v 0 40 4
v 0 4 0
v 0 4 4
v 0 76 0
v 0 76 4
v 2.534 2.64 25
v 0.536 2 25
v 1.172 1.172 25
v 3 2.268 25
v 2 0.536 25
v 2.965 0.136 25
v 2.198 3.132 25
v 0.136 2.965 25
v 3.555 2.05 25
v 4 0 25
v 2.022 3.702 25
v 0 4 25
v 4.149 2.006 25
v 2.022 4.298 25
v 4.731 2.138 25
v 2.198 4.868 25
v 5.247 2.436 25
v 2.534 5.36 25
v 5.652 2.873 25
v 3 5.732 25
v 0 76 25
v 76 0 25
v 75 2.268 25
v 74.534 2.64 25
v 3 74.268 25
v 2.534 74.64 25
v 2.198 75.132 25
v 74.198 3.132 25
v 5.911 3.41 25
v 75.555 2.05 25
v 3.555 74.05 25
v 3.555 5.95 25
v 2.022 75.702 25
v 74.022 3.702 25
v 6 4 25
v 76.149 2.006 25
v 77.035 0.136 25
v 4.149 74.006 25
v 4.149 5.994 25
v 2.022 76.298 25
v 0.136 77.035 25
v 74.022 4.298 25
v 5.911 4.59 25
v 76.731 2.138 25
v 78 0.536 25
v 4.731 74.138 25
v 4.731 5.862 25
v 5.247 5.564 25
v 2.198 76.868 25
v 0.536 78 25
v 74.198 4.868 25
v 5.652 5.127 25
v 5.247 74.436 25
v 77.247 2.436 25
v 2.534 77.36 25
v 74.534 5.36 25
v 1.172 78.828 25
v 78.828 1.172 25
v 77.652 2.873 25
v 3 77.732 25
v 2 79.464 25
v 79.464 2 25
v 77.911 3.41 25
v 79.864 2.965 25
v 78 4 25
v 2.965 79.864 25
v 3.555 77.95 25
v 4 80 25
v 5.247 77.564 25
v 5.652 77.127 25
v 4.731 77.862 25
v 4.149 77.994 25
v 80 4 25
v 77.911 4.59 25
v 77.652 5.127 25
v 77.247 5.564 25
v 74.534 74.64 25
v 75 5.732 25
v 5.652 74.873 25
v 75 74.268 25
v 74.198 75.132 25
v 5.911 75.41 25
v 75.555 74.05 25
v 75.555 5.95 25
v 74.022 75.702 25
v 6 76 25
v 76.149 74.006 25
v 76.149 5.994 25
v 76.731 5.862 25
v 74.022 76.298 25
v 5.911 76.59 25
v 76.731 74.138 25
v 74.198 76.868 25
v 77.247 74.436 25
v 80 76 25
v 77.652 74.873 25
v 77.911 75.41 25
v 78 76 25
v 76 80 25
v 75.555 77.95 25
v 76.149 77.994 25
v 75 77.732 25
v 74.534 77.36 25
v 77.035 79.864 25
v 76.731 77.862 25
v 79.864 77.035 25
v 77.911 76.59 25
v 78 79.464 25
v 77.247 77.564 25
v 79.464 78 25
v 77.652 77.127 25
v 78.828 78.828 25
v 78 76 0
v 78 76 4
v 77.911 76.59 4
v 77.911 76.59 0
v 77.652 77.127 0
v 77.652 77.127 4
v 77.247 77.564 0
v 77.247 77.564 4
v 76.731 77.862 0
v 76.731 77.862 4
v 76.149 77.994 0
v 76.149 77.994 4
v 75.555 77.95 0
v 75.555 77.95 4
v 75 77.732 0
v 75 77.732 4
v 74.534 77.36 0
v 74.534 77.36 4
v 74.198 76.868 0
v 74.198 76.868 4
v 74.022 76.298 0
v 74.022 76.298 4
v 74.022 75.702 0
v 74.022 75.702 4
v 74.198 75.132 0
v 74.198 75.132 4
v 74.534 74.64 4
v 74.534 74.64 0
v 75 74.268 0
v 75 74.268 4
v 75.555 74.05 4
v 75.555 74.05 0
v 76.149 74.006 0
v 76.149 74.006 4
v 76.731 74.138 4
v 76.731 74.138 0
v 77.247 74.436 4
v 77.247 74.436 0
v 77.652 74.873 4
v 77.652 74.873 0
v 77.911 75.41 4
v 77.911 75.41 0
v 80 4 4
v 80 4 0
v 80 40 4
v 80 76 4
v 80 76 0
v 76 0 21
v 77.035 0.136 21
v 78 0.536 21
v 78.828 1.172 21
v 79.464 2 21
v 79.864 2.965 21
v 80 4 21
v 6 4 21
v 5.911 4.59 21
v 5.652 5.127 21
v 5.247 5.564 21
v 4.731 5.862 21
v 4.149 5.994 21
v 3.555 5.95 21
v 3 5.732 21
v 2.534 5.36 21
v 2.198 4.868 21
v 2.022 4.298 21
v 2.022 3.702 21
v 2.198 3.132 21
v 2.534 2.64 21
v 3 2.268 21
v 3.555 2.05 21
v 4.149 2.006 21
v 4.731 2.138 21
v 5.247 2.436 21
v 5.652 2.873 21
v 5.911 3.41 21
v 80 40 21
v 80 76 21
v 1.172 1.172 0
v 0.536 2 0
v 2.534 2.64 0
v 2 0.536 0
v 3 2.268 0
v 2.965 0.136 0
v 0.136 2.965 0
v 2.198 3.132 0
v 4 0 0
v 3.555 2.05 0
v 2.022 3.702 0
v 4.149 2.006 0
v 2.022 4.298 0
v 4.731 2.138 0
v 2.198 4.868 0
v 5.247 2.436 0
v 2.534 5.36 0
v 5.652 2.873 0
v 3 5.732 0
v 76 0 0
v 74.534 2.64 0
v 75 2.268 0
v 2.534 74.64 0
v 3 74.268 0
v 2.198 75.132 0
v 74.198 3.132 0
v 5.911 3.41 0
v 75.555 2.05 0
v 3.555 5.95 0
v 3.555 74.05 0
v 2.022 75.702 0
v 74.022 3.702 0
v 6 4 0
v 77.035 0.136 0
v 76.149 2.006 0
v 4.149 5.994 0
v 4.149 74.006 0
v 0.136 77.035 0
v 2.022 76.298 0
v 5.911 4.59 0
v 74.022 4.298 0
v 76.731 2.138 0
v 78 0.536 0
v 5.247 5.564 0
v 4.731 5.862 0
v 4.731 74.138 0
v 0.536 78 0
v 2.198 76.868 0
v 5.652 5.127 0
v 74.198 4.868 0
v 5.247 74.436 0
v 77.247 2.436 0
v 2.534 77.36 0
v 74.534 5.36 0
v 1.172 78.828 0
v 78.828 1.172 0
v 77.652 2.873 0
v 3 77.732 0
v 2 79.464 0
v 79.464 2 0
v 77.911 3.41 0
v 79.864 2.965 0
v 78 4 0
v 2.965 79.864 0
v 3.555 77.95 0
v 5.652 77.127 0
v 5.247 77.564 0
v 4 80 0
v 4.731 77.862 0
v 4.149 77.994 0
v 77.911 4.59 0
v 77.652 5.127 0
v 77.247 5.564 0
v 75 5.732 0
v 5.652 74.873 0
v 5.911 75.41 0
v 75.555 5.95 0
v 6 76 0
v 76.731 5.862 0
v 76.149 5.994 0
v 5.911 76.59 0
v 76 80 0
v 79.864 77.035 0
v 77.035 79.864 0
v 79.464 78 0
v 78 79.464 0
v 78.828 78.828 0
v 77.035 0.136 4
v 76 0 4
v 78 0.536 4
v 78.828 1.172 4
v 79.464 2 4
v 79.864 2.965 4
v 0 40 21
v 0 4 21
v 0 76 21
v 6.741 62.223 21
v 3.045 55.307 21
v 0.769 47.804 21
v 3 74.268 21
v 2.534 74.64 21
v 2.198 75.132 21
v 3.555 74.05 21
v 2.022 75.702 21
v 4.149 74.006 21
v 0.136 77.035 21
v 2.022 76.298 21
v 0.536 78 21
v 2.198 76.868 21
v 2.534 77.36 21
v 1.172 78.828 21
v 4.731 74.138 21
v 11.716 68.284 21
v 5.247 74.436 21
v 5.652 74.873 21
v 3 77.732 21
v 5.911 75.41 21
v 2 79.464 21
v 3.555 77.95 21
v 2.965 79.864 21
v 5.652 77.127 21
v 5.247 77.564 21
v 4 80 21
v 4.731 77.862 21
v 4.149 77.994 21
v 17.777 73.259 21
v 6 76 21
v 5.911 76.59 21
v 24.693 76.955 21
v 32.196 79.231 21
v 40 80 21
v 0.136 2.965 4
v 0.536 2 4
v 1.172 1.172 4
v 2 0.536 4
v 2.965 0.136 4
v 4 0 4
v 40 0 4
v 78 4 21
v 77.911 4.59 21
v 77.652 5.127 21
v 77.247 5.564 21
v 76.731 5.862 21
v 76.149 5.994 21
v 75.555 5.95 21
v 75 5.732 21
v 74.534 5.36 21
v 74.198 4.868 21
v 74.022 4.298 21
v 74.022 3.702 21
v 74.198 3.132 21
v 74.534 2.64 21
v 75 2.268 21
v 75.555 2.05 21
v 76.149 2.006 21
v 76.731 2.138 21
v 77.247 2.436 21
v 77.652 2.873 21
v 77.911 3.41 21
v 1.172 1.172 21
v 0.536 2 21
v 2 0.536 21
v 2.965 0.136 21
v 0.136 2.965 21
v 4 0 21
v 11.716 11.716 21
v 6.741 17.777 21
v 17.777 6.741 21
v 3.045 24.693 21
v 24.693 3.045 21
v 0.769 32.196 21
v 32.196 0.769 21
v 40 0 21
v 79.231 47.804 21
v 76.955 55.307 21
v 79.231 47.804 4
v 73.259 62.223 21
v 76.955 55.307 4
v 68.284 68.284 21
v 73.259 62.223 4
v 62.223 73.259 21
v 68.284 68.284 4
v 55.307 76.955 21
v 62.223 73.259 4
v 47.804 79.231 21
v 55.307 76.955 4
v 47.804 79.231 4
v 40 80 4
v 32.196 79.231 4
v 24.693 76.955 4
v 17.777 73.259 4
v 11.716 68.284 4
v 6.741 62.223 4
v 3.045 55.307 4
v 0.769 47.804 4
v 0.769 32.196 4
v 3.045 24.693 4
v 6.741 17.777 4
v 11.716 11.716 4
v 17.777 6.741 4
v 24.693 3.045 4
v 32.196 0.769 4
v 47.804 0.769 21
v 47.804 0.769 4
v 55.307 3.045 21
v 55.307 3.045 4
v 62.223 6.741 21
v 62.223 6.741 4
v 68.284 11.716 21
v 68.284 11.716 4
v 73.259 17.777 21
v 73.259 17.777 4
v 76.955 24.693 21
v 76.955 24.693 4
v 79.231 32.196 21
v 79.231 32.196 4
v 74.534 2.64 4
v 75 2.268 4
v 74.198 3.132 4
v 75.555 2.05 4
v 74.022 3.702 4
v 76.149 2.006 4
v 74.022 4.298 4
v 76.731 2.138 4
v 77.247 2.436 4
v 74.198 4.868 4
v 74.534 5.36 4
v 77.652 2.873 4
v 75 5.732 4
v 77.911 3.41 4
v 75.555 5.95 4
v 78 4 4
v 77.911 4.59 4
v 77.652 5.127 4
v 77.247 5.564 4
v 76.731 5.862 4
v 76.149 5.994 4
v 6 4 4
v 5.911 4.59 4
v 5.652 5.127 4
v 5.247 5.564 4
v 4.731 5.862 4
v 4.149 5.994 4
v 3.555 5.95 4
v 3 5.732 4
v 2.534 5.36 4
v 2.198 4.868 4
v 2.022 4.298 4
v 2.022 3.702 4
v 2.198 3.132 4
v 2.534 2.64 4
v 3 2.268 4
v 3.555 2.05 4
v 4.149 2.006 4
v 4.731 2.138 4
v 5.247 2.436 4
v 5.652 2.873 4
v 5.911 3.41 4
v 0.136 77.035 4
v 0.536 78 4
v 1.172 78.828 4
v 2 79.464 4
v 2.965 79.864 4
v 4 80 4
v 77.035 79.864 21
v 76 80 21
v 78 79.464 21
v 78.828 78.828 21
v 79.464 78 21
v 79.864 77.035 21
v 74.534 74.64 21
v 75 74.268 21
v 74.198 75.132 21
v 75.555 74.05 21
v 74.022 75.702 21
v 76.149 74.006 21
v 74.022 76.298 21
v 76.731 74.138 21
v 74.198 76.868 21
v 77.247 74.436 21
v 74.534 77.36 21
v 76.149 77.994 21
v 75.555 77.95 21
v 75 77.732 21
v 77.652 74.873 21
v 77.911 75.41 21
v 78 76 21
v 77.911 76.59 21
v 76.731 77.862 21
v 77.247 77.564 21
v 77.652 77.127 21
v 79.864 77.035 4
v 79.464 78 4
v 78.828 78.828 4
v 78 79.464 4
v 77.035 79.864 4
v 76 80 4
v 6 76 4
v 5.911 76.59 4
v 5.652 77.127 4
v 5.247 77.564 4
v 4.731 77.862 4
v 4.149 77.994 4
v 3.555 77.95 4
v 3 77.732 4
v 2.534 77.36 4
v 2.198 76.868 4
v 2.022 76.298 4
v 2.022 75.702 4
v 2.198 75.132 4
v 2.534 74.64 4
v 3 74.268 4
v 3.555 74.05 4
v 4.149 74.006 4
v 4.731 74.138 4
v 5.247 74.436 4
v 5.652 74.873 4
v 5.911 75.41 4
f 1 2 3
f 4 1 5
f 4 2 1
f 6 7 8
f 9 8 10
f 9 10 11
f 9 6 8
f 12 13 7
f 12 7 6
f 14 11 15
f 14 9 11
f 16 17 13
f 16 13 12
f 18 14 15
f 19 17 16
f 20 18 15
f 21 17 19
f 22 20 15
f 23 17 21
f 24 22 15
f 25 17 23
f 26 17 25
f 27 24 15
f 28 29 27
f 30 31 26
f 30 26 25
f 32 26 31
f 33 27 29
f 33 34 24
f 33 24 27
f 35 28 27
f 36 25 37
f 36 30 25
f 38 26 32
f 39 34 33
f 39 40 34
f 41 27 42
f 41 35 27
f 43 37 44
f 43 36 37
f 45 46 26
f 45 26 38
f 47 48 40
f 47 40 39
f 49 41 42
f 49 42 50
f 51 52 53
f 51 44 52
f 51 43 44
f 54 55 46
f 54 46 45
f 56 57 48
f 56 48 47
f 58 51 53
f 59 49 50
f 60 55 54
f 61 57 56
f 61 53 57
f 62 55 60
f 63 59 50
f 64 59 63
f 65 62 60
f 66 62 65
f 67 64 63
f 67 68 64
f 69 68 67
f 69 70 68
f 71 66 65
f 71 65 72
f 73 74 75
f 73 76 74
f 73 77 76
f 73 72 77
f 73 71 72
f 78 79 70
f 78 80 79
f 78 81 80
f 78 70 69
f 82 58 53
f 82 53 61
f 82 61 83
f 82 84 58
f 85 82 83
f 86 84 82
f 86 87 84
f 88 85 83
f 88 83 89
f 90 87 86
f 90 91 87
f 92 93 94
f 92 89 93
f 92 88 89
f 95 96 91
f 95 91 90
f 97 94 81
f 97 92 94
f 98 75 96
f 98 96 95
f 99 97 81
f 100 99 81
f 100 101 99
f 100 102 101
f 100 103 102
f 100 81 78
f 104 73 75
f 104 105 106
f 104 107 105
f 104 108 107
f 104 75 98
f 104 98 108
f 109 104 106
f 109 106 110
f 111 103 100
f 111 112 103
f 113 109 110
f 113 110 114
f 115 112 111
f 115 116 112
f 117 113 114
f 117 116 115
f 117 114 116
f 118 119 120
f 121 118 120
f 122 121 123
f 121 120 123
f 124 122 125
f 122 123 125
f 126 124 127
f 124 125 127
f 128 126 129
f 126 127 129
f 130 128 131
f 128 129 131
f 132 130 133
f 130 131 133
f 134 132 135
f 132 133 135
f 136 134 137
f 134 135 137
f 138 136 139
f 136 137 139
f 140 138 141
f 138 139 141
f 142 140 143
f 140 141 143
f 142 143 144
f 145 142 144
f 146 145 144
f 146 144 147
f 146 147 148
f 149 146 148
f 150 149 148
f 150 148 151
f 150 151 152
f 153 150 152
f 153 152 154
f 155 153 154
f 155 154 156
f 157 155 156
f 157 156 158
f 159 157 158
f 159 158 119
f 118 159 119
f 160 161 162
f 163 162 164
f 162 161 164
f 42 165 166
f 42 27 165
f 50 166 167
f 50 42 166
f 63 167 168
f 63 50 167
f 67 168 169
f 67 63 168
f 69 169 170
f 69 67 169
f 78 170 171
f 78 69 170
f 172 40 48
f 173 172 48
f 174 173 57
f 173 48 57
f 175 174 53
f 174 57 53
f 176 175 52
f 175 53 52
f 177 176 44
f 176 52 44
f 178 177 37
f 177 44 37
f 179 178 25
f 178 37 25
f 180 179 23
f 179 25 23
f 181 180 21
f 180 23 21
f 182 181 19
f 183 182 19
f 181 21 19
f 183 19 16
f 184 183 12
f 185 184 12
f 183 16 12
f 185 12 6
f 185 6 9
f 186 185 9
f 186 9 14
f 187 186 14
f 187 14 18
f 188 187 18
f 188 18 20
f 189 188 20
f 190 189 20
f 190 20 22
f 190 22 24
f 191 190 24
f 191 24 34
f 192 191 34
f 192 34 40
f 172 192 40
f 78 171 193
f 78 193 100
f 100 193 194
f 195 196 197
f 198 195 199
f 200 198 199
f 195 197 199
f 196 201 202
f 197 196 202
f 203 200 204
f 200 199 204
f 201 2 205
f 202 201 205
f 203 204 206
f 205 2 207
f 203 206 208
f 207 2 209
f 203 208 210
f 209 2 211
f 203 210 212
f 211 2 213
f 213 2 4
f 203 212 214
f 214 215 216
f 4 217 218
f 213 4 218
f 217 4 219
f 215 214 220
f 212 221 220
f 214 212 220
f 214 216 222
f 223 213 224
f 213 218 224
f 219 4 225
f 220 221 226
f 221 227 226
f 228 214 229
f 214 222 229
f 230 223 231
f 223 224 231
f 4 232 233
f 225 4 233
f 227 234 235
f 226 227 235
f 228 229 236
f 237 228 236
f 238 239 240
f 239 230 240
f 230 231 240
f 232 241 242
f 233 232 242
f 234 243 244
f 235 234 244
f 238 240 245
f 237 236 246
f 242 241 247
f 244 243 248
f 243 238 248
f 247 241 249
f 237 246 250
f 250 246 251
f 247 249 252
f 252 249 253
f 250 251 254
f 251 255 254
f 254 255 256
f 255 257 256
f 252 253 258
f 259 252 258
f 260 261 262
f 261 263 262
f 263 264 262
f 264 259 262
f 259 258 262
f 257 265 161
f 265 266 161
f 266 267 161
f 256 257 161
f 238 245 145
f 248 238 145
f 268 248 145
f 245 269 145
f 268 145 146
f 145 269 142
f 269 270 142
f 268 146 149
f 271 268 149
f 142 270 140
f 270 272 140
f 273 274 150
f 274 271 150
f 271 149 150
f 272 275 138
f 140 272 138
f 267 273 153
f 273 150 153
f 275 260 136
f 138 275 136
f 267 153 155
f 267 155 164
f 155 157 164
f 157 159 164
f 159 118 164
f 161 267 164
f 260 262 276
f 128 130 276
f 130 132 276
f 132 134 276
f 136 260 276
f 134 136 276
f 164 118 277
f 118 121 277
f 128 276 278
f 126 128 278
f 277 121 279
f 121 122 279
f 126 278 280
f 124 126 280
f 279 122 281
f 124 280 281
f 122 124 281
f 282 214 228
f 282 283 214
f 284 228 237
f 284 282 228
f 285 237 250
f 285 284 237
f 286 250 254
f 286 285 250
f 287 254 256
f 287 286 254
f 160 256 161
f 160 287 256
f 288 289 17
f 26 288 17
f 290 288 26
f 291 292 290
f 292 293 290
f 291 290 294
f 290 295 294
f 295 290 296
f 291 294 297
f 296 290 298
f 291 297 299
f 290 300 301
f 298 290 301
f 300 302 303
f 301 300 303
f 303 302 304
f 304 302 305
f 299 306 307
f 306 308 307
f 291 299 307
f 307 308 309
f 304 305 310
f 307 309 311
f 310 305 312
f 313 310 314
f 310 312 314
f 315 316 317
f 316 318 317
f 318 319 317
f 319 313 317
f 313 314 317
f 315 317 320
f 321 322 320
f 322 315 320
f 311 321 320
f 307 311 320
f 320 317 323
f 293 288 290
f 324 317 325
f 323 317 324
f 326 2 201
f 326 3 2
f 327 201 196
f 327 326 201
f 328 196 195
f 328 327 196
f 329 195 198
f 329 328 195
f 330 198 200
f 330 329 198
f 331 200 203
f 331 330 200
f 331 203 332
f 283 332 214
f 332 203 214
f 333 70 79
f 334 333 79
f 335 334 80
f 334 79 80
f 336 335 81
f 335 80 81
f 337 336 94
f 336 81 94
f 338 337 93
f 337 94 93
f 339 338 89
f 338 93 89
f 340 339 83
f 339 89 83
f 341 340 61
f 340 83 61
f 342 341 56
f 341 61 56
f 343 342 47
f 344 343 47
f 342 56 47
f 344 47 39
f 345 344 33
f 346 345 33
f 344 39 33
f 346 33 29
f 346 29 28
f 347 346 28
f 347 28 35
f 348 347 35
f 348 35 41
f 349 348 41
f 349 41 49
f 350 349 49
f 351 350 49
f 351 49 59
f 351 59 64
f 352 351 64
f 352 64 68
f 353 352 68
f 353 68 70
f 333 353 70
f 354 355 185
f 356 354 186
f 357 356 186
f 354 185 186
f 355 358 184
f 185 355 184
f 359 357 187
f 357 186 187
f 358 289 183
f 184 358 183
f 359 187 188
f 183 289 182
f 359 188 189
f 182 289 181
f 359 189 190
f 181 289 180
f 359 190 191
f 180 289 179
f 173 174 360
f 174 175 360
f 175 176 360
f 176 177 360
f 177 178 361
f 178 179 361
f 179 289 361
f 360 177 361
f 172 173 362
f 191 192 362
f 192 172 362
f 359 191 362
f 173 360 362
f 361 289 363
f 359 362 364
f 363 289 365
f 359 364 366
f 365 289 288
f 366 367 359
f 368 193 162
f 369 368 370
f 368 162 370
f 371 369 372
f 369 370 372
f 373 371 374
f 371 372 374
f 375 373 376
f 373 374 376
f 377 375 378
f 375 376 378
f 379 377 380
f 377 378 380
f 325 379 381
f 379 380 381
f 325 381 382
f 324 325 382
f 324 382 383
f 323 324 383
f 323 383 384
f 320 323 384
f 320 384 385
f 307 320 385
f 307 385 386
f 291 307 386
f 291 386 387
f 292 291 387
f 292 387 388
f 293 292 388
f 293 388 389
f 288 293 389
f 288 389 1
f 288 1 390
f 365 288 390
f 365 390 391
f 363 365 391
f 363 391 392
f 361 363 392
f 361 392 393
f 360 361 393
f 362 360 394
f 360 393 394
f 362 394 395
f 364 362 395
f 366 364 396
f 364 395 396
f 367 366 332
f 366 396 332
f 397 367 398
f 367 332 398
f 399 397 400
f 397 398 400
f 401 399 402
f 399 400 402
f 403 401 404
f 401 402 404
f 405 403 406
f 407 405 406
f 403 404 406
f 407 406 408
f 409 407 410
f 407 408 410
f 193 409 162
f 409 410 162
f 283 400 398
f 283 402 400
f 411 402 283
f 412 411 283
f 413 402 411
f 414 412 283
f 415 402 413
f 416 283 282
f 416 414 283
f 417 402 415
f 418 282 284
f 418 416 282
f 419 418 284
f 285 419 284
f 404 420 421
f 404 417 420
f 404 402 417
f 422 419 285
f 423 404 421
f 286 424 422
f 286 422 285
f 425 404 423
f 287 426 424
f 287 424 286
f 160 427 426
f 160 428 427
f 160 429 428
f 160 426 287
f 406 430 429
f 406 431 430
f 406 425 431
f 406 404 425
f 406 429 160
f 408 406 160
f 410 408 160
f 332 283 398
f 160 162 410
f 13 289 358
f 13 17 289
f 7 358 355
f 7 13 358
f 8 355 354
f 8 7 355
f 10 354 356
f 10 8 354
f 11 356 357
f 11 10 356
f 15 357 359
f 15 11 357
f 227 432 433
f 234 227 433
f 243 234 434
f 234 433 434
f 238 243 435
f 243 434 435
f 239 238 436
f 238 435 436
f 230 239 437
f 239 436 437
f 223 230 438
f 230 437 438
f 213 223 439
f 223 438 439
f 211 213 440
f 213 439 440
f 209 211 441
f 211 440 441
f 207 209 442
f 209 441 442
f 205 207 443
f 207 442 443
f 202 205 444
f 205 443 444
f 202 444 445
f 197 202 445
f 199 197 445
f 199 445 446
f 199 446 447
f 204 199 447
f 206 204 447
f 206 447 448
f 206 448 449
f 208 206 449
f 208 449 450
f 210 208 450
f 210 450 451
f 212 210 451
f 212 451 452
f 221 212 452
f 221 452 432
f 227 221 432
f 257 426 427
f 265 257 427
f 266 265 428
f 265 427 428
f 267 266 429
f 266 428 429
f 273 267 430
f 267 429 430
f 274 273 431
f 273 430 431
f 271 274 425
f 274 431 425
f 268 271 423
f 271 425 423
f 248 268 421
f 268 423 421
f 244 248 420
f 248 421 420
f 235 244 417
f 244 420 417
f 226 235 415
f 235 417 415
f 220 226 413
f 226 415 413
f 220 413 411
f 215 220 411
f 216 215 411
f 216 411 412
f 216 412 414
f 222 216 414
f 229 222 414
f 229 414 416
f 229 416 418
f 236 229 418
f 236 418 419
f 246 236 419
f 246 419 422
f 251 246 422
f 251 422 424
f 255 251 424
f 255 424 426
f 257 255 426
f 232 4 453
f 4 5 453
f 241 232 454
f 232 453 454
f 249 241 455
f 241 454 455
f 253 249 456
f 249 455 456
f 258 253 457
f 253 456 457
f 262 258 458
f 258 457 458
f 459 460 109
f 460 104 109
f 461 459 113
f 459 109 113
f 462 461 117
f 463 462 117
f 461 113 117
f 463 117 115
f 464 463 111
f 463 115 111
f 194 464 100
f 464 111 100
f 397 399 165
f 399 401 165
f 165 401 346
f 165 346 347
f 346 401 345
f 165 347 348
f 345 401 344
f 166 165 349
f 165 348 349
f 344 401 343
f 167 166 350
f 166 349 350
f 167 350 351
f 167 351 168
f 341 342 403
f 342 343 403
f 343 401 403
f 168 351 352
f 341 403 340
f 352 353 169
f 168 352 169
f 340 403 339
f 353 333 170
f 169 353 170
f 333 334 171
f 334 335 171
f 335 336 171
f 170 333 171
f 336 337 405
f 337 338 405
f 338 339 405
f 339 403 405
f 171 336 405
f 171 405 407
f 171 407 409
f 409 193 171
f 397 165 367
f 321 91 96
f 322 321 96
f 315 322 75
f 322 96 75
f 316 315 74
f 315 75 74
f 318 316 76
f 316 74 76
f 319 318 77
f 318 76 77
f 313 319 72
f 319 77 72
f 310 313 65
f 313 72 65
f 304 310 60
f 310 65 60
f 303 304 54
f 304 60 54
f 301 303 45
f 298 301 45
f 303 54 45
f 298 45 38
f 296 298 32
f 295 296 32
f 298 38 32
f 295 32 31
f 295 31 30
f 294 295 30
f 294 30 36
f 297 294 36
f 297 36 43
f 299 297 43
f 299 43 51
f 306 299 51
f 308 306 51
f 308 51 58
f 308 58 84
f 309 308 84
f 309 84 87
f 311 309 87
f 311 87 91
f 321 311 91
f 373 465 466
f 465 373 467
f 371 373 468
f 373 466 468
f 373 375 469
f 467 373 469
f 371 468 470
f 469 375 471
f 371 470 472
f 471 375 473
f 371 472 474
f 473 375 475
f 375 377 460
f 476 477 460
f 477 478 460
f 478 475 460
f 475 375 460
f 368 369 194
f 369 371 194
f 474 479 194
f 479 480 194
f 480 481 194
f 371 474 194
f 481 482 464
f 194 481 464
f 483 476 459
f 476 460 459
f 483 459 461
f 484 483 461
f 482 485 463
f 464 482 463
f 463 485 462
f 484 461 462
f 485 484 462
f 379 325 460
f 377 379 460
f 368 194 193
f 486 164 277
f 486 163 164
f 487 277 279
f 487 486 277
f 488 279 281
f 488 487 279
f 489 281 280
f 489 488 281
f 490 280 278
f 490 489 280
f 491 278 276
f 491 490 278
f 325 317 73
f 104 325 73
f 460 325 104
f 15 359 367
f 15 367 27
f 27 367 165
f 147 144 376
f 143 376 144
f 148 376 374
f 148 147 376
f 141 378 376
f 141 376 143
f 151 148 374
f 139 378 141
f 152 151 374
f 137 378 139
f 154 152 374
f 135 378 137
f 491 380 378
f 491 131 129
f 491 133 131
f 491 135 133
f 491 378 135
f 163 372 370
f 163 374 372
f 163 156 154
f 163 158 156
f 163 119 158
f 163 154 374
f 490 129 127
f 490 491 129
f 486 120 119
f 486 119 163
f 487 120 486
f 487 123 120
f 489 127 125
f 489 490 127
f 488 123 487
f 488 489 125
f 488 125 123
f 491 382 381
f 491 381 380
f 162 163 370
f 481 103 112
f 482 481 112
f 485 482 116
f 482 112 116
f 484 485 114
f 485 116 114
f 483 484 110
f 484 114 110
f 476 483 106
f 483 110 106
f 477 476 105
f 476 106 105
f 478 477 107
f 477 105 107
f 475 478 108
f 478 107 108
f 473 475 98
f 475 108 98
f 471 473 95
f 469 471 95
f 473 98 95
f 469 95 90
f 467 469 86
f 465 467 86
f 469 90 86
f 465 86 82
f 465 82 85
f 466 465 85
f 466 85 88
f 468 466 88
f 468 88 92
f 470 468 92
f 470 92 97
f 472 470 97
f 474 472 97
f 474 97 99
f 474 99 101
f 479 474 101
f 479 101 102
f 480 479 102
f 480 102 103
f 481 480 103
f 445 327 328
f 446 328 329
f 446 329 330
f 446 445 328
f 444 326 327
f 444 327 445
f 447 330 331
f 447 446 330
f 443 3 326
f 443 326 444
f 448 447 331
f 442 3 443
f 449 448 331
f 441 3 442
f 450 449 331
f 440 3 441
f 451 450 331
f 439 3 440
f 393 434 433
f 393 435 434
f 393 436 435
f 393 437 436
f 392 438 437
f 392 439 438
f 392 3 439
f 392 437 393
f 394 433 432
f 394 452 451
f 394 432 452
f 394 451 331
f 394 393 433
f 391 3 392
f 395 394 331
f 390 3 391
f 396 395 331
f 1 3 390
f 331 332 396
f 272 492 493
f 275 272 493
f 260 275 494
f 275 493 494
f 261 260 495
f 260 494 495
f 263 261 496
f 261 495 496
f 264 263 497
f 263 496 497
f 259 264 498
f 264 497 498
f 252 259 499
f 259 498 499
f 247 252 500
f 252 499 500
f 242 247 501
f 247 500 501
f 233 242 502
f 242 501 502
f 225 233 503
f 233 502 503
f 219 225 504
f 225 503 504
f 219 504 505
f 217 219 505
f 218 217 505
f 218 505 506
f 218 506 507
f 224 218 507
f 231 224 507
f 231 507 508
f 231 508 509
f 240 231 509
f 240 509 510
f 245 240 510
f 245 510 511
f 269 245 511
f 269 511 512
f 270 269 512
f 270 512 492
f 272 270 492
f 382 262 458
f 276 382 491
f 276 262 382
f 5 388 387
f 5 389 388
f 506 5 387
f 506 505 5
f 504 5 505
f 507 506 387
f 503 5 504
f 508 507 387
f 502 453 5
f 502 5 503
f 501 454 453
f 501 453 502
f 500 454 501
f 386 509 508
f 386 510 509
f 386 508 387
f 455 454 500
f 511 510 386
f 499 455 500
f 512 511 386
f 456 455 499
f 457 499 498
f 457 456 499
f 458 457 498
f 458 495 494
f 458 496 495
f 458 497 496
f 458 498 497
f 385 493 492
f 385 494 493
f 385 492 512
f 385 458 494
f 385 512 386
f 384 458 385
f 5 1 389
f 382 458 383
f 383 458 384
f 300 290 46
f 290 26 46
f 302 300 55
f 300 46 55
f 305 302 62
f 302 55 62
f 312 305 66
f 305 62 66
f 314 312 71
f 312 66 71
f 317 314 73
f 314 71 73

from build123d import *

# Parameters (mm, degrees)
SKETCH1_W             = 80
SKETCH1_H             = 80
BOSS_EXTRUDE1_DEPTH   = 4
FILLET2_R             = 4
SKETCH3_R             = 40
BOSS_EXTRUDE2_DEPTH   = 17
SKETCH4_W             = 80
SKETCH4_H             = 80
BOSS_EXTRUDE3_DEPTH   = 4
FILLET3_R             = 4
F_4_0MM_DOWEL_HOLE1_D = 4


with BuildPart() as part:
    # Sketch1 → Boss-Extrude1 (new body)
    with BuildSketch(Plane.XY):
        with Locations((40, 40)):
            Rectangle(SKETCH1_W, SKETCH1_H)
    extrude(amount=BOSS_EXTRUDE1_DEPTH)

    # Fillet2
    fillet2_edges = [part.edges().sort_by_distance(p)[0] for p in [
        (0, 0, 2),
        (0, 80, 2),
        (80, 80, 2),
        (80, 0, 2),
    ]]
    fillet(fillet2_edges, radius=FILLET2_R)

    # Sketch3 → Boss-Extrude2 (add)
    with BuildSketch(Plane.XY.offset(4)):
        with Locations((40, 40)):
            Circle(SKETCH3_R)
    extrude(amount=BOSS_EXTRUDE2_DEPTH)

    # Sketch4 → Boss-Extrude3 (add)
    with BuildSketch(Plane.XY.offset(21)):
        with Locations((40, 40)):
            Rectangle(SKETCH4_W, SKETCH4_H)
    extrude(amount=BOSS_EXTRUDE3_DEPTH)

    # Fillet3
    fillet3_edges = [part.edges().sort_by_distance(p)[0] for p in [
        (0, 80, 23),
        (0, 0, 23),
        (80, 0, 23),
        (80, 80, 23),
    ]]
    fillet(fillet3_edges, radius=FILLET3_R)

    # Ø4.0mm Dowel Hole1 (through all)
    with Locations(Plane(origin=(0, 0, 0), x_dir=(-1, 0, 0), z_dir=(0, 0, -1))):
        with Locations((-76, 76), (-4, 76), (-4, 4), (-76, 4)):
            Hole(F_4_0MM_DOWEL_HOLE1_D / 2)


solid = part.part
